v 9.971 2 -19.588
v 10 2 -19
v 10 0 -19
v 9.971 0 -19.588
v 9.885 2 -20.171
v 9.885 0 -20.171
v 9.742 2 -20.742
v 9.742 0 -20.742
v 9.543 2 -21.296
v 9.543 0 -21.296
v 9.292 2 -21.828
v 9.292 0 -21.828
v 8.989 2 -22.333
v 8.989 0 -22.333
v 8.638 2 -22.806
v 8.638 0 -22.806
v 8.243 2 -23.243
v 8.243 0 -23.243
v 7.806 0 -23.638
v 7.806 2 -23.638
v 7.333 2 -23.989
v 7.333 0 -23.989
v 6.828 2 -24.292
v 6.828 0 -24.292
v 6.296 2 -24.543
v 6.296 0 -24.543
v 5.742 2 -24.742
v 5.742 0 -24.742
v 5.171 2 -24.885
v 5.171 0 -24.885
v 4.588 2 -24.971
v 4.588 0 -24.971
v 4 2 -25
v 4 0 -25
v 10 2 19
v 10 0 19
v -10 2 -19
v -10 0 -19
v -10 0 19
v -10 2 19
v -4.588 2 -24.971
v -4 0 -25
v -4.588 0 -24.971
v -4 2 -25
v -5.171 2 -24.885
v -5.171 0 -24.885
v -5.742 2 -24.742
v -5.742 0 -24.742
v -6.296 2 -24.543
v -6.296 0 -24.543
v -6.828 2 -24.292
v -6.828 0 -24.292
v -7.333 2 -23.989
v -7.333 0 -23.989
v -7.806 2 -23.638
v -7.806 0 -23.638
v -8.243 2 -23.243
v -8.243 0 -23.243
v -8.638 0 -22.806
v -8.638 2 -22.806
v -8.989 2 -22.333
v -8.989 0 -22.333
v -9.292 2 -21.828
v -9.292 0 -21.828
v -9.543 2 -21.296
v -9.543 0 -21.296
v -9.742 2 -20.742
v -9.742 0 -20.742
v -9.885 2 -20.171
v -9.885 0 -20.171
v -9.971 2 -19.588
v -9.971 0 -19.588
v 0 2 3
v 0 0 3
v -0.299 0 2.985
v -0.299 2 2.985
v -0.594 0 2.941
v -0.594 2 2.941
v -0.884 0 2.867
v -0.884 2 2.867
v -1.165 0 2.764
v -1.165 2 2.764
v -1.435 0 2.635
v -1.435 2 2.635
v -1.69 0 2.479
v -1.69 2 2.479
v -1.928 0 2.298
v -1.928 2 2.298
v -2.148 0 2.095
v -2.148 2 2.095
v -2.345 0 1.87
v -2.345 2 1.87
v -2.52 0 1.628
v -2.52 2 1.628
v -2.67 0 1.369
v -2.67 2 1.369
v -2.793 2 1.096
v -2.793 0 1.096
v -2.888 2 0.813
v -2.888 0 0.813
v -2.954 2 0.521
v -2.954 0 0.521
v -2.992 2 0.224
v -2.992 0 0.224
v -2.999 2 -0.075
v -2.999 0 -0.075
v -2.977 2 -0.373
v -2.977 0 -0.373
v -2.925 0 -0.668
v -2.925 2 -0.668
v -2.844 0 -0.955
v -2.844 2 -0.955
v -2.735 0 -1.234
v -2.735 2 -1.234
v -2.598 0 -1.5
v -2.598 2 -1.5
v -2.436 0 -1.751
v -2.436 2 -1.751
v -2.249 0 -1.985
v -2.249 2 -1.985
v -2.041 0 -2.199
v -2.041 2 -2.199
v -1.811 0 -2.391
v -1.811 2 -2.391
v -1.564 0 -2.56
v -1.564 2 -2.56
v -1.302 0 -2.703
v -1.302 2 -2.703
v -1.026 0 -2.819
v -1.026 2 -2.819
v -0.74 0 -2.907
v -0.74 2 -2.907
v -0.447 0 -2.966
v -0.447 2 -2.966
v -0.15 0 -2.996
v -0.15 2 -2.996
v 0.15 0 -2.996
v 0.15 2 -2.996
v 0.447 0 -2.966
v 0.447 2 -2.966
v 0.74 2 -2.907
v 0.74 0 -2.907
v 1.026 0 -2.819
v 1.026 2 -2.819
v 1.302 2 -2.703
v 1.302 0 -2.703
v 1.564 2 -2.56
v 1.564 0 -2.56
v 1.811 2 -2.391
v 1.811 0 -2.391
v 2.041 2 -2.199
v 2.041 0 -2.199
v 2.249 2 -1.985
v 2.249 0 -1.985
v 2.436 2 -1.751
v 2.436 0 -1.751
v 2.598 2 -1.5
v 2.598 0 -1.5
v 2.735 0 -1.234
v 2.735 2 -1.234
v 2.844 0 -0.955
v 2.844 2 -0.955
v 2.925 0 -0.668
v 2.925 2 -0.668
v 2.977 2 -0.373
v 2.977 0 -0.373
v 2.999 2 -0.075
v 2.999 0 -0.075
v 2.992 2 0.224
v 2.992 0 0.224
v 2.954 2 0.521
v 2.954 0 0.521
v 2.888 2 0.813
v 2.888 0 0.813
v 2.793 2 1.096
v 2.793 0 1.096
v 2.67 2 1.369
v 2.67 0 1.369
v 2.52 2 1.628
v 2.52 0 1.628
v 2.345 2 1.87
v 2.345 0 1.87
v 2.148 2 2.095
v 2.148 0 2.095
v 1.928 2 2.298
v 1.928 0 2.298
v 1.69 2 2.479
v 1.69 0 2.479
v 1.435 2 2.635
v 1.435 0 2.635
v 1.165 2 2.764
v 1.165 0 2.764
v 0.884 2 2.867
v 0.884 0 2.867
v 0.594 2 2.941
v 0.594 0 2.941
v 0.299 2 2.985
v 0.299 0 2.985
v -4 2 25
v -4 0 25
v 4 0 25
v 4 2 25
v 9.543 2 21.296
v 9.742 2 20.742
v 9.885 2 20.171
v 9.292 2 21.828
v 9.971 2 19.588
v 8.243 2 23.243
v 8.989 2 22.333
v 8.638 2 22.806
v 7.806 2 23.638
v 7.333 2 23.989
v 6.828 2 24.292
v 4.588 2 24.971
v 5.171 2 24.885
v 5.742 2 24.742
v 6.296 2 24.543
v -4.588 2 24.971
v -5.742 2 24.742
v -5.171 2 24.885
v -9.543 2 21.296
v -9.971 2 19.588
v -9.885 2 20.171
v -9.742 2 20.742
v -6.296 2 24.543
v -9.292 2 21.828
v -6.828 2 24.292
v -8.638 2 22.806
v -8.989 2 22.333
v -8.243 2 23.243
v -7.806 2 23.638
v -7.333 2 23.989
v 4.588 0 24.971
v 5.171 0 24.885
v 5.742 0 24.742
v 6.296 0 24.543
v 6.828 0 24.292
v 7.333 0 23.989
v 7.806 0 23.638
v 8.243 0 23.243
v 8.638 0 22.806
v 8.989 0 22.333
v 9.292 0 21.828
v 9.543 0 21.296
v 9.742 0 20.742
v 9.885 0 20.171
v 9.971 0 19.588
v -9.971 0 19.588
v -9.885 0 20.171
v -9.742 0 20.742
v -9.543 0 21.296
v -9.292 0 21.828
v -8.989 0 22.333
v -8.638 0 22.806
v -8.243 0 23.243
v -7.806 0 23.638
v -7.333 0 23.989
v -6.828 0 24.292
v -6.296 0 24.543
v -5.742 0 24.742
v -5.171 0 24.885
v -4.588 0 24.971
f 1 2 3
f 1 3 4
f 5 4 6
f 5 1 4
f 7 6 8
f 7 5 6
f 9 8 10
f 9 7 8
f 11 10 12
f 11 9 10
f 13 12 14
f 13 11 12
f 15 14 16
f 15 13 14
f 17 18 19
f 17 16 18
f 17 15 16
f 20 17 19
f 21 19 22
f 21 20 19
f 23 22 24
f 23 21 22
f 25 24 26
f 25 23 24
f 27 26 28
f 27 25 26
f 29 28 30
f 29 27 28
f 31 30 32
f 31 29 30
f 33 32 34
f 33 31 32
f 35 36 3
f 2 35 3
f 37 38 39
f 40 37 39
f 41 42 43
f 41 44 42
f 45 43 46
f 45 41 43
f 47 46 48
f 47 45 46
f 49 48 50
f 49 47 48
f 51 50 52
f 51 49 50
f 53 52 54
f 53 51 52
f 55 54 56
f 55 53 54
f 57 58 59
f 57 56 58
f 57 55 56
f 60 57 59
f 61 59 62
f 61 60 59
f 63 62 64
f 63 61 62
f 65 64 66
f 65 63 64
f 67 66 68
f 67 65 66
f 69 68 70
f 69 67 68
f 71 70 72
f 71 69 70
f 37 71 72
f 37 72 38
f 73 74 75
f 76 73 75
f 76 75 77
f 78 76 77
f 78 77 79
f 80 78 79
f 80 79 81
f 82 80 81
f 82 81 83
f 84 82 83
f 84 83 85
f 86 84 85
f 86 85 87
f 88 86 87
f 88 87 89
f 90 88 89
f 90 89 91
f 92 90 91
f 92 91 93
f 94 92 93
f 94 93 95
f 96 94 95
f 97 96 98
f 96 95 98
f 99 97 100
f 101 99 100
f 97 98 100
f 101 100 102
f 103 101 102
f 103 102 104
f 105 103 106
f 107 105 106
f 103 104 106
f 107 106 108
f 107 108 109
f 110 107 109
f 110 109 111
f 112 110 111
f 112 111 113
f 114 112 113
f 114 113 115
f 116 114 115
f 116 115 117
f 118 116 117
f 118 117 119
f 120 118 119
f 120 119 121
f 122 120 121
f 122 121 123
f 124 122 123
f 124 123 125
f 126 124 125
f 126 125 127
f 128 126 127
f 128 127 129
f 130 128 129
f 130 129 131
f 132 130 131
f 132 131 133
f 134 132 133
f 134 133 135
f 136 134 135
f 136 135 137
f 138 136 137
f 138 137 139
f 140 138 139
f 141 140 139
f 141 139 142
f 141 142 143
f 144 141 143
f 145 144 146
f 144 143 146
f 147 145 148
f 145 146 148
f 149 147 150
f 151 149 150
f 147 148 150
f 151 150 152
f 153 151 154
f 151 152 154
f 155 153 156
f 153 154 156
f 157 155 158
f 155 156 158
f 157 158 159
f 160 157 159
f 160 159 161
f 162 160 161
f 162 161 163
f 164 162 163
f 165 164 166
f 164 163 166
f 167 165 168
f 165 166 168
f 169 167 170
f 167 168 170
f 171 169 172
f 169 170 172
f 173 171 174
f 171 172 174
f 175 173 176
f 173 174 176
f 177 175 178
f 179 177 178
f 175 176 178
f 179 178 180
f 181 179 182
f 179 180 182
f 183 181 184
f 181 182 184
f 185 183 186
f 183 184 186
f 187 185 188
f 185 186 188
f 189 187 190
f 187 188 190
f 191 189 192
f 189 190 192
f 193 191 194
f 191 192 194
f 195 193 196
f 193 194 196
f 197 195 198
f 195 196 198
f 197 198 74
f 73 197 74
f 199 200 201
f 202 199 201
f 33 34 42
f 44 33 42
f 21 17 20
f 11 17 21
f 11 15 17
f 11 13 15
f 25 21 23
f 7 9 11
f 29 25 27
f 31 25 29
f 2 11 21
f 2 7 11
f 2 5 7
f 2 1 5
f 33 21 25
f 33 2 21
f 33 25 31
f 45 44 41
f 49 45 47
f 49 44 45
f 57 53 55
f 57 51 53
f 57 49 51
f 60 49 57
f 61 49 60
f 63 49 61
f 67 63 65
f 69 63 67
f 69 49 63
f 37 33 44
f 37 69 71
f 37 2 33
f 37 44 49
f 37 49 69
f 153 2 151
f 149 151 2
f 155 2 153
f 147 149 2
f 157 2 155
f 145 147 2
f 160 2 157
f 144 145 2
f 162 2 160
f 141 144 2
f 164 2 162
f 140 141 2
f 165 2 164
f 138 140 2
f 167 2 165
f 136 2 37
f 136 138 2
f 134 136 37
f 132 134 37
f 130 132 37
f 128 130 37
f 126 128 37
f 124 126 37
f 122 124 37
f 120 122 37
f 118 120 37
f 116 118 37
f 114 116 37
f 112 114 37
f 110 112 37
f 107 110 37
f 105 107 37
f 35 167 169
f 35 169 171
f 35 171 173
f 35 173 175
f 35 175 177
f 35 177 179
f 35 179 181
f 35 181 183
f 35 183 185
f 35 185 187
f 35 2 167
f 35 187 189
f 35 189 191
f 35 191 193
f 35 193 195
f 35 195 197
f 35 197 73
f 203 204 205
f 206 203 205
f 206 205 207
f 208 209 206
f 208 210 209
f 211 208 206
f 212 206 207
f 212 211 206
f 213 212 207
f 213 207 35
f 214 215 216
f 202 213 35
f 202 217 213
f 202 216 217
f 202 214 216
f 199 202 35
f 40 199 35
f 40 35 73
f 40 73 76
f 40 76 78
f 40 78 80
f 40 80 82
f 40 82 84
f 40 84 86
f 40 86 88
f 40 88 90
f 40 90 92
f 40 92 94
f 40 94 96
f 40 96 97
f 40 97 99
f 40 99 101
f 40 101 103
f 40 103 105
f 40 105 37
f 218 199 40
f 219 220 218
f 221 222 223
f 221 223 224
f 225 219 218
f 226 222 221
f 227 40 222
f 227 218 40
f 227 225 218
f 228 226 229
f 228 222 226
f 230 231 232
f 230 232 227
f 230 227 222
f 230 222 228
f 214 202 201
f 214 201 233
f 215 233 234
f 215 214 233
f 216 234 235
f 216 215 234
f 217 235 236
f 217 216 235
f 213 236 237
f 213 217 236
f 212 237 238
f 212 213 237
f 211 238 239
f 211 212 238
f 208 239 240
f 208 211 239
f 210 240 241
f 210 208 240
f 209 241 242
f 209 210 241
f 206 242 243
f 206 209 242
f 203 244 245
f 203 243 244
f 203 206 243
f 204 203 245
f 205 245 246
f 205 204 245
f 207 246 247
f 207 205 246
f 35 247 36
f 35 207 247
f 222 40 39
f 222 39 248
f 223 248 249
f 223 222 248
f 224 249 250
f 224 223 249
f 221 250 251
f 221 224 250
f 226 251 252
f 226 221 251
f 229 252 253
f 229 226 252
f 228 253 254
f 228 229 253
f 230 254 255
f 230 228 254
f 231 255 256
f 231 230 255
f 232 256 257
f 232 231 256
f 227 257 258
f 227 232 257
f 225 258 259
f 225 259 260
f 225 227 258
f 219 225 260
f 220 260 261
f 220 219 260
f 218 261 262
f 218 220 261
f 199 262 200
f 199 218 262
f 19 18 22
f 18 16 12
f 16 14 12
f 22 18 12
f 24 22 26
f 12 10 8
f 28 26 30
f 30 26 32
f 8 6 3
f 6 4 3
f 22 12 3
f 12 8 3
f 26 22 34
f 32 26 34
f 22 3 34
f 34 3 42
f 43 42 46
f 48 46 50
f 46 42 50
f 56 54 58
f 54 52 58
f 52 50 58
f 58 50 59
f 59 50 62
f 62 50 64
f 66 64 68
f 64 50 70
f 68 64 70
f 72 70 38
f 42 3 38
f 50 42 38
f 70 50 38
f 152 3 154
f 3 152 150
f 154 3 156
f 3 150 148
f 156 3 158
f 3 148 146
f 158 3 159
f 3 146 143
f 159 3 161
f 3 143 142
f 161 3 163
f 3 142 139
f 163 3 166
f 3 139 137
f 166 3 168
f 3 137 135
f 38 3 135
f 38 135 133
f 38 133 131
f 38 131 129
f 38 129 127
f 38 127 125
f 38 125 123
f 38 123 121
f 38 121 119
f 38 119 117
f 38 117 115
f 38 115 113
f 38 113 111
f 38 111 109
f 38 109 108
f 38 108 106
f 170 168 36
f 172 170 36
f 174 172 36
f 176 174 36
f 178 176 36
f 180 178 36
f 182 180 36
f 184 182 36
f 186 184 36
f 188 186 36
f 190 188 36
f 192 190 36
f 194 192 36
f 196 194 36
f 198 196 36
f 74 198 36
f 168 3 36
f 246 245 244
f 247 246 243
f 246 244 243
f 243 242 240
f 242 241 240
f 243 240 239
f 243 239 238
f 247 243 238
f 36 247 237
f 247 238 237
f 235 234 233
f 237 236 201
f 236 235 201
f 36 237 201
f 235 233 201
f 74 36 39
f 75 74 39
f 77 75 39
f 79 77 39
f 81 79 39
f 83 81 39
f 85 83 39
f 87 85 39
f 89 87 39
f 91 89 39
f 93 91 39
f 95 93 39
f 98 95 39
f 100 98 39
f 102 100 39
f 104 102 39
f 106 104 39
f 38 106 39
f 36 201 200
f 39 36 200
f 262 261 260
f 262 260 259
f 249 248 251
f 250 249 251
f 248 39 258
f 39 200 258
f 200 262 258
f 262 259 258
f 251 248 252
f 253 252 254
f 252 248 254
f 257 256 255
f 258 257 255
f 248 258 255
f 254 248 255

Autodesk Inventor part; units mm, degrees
ref_plane "YZ Plane" through (0, 0, 0) normal (1, 0, 0) x (0, 1, 0)
ref_plane "XZ Plane" through (0, 0, 0) normal (0, 1, 0) x (-1, 0, 0)
ref_plane "XY Plane" through (0, 0, 0) normal (0, 0, 1) x (1, 0, 0)
sketch "草圖1" plane through (0, 0, 0) normal (0, 1, 0) x (-1, 0, 0)
  line L0 (10, 25) -> (-10, 25)
  line L1 (-10, 25) -> (-10, -25)
  line L2 (-10, -25) -> (10, -25)
  line L3 (10, -25) -> (10, 25)
  line L4 (10, 25) -> (-10, -25) construction
  line L5 (-10, 25) -> (10, -25) construction
  point P0 (0, 0)
  dimension "d0" = 20
  dimension "d1" = 50
extrude "平板1" add sketch "草圖1" along normal blind 2
fillet "轉角外圓角1" radius 6 4 edges at (10, 1, 25) (-10, 1, 25) (-10, 1, -25) (10, 1, -25)
sketch "草圖4" plane through (0, 2, 0) normal (0, 1, 0) x (1, 0, 0)
  point P0 (0, 0)
  point P1 (0, 0)
hole "孔2" at (0, 2, 0) direction (0, -1, 0) diameter 6 end through all
equation "\"d18\" = 厚度"
equation "\"d2\" = 厚度"
equation "\"折彎半徑\" = 厚度"
equation "\"折彎離隙寬度\" = 厚度"
equation "\"折彎離隙深度\" = 0.5 * 厚度"
equation "\"轉角離隙大小\" = 4 * 厚度"
equation "\"最小剩餘\" = 2 * 厚度"
equation "\"轉移半徑\" = 折彎半徑"
equation "\"Jacobi半徑大小\" = 折彎半徑"
equation "\"間隙大小\" = 厚度"
equation "\"厚度\" = 2"
properties part number "底部外殼固定板金"
